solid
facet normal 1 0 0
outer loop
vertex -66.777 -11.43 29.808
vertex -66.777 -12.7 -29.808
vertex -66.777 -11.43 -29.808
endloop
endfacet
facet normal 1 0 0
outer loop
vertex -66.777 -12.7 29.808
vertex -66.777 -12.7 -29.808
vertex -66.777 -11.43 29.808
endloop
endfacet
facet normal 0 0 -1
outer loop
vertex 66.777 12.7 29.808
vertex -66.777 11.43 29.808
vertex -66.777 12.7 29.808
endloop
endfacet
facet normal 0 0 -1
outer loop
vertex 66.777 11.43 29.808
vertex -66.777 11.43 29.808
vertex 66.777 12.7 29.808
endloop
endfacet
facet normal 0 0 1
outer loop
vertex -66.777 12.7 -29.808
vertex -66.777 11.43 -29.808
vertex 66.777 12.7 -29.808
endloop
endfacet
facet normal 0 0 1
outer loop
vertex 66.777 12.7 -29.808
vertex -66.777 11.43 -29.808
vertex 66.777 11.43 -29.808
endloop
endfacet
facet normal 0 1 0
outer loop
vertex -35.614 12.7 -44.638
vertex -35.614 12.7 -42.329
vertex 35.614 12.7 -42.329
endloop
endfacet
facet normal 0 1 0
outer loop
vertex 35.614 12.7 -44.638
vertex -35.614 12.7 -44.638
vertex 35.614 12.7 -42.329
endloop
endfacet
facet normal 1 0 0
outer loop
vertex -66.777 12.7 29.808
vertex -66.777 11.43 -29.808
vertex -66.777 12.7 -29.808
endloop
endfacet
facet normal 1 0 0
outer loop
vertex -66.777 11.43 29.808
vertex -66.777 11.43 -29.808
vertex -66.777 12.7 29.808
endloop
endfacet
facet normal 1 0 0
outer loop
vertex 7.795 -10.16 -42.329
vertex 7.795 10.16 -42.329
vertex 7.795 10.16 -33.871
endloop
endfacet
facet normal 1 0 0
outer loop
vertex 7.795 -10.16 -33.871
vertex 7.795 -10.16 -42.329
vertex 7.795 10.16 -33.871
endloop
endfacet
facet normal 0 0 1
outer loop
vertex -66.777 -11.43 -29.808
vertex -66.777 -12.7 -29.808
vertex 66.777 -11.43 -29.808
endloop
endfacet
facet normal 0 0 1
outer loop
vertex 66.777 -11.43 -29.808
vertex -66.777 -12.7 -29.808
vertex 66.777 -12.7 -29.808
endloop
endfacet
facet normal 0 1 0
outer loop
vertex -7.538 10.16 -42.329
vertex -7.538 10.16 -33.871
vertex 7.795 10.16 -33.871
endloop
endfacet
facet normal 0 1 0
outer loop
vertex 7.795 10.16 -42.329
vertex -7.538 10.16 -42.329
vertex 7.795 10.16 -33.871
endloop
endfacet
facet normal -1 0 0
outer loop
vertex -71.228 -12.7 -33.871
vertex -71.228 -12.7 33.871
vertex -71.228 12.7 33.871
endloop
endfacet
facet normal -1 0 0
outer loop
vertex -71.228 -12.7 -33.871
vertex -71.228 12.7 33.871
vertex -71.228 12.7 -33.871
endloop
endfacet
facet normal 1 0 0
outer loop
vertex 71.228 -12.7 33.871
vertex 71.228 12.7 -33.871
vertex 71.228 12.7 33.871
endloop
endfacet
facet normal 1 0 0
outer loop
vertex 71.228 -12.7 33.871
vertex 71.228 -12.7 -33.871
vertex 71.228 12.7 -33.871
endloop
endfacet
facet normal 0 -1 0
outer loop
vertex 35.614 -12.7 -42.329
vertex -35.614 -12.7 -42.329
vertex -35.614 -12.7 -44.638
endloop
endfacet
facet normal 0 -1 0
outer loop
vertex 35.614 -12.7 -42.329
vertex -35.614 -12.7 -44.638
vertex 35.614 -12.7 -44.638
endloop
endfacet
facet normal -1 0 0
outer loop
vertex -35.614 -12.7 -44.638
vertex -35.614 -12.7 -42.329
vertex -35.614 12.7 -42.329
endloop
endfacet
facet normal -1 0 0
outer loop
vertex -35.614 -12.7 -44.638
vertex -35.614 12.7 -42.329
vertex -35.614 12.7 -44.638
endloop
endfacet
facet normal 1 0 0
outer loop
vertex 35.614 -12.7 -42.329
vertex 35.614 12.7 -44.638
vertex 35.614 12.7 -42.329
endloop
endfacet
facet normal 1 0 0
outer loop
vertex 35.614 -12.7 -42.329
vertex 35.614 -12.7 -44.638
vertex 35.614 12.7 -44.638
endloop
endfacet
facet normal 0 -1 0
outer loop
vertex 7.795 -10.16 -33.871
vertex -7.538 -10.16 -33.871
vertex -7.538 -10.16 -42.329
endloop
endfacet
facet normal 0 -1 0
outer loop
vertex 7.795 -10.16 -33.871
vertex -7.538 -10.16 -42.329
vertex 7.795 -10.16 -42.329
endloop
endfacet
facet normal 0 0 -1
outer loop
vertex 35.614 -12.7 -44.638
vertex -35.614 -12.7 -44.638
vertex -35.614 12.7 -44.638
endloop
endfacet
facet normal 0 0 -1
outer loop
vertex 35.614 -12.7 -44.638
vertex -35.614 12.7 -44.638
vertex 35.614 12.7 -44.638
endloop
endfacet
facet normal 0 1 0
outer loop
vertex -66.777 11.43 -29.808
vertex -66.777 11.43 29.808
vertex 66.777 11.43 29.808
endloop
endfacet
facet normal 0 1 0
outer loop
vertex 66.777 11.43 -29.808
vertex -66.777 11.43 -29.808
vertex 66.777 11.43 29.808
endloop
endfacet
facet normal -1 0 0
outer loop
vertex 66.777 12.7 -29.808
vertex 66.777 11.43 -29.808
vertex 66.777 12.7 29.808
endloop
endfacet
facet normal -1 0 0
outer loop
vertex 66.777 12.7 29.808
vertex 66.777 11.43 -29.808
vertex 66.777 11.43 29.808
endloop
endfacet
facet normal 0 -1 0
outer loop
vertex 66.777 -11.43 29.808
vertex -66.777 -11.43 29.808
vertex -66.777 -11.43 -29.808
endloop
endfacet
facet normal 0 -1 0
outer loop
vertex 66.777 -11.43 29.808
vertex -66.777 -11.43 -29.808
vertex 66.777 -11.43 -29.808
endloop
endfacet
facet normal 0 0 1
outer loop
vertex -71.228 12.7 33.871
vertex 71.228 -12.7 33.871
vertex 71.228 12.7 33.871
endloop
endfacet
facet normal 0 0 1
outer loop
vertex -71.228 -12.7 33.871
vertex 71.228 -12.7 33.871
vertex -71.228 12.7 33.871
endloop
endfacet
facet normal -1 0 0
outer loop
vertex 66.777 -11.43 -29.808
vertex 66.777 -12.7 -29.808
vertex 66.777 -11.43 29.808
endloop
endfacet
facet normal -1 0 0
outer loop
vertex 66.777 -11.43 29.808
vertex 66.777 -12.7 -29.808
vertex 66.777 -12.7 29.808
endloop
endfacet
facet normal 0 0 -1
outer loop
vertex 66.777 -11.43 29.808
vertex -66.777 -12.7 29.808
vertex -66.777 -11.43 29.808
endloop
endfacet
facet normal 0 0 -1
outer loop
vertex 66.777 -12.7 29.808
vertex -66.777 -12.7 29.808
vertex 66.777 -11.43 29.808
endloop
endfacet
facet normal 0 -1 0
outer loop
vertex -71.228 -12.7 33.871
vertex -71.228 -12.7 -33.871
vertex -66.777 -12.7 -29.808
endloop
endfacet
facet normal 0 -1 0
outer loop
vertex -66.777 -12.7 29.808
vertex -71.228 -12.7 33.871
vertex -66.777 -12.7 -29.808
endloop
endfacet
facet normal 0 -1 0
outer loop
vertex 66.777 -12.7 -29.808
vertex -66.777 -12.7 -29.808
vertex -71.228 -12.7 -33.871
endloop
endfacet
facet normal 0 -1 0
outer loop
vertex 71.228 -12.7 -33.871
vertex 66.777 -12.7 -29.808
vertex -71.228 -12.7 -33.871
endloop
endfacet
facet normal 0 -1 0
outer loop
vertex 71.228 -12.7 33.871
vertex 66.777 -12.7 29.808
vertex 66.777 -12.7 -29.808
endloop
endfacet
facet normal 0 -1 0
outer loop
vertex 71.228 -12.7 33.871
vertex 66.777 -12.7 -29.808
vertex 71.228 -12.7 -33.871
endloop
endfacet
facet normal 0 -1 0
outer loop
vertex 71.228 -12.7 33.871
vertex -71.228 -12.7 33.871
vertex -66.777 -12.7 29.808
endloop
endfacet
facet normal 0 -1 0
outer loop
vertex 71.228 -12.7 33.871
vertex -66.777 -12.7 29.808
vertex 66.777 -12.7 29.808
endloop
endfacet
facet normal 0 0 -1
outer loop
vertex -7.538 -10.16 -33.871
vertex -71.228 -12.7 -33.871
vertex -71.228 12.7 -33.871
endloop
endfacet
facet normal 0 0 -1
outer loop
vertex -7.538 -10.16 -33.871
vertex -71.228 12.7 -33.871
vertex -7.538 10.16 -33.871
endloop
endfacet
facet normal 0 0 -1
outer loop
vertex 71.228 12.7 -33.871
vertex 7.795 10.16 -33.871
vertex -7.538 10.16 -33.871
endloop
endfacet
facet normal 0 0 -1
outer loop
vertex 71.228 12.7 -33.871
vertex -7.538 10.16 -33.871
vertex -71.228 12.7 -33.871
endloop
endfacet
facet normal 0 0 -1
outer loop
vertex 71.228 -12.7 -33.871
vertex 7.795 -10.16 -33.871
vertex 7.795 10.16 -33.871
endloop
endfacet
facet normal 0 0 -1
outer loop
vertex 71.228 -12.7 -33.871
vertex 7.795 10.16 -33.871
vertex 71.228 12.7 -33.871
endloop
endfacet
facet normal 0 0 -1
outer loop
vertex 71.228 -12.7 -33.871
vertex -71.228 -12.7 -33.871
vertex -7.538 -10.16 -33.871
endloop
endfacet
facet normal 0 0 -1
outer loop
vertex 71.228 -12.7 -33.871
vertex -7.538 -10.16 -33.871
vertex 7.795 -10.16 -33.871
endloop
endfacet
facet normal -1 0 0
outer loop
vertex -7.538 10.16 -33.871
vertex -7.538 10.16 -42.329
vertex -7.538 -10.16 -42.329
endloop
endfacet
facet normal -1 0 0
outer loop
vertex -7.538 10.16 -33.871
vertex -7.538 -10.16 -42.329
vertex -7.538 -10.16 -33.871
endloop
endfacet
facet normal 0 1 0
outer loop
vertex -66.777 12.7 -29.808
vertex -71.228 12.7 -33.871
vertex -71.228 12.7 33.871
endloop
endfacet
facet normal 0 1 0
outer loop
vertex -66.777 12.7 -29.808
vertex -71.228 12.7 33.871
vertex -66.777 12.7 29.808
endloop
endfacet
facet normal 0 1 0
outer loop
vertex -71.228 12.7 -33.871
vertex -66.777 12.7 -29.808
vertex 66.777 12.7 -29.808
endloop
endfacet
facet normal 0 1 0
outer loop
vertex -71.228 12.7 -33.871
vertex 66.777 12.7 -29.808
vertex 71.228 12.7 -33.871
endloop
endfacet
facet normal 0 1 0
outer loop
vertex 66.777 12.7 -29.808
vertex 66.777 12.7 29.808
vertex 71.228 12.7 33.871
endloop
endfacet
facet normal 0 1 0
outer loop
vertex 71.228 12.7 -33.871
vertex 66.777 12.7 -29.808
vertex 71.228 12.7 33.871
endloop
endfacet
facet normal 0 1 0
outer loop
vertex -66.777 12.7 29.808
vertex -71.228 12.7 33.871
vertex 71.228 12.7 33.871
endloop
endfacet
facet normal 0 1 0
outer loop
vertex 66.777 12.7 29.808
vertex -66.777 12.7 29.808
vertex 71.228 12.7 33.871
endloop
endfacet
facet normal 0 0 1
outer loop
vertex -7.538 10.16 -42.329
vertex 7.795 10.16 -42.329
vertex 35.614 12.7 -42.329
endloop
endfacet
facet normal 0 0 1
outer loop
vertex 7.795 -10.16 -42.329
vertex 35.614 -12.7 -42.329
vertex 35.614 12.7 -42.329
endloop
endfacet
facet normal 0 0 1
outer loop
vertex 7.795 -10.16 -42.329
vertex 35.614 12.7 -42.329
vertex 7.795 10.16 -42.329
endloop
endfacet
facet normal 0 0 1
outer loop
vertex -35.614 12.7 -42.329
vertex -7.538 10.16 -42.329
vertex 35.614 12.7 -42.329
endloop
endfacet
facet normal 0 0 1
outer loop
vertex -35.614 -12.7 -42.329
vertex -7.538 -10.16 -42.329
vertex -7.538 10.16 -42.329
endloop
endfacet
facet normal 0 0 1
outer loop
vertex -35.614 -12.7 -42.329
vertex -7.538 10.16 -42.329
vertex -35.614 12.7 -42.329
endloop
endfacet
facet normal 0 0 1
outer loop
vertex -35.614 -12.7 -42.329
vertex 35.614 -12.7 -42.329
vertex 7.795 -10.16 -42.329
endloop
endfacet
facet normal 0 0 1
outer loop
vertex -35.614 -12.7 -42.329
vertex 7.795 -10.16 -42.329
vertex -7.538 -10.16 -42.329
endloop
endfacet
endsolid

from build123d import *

# Parameters (mm, degrees)
F0_W     = 133.553728
F0_H     = 59.615288
F1_DEPTH = 12.7
F2_DEPTH = 11.43
F0_W_2   = 15.333298
F0_H_2   = 8.458886
F3_DEPTH = 10.16
F4_DEPTH = 12.7


with BuildPart() as f1:
    # F0 (on Front) → F1 (new body, symmetric)
    with BuildSketch(Plane.XZ):
        Polygon((71.228367, -33.870557), (71.228367, 33.870557), (-71.228367, 33.870557), (-71.228367, -33.870557), (-7.538104, -33.870557), (7.795194, -33.870557), align=None)
        Rectangle(F0_W, F0_H, mode=Mode.SUBTRACT)
    extrude(amount=F1_DEPTH, both=True)

    # F0 (on Front) → F2 (join, symmetric)
    with BuildSketch(Plane.XZ):
        Rectangle(F0_W, F0_H)
    extrude(amount=F2_DEPTH, both=True)

    # F0 (on Front) → F3 (join, symmetric)
    with BuildSketch(Plane.XZ):
        with Locations((0.128545, -38.1)):
            Rectangle(F0_W_2, F0_H_2)
    extrude(amount=F3_DEPTH, both=True)

    # F0 (on Front) → F4 (join, symmetric)
    with BuildSketch(Plane.XZ):
        Polygon((35.614184, -42.329443), (7.795194, -42.329443), (-7.538104, -42.329443), (-35.614184, -42.329443), (-35.614184, -44.638067), (35.614184, -44.638067), align=None)
    extrude(amount=F4_DEPTH, both=True)


solid = f1.part
